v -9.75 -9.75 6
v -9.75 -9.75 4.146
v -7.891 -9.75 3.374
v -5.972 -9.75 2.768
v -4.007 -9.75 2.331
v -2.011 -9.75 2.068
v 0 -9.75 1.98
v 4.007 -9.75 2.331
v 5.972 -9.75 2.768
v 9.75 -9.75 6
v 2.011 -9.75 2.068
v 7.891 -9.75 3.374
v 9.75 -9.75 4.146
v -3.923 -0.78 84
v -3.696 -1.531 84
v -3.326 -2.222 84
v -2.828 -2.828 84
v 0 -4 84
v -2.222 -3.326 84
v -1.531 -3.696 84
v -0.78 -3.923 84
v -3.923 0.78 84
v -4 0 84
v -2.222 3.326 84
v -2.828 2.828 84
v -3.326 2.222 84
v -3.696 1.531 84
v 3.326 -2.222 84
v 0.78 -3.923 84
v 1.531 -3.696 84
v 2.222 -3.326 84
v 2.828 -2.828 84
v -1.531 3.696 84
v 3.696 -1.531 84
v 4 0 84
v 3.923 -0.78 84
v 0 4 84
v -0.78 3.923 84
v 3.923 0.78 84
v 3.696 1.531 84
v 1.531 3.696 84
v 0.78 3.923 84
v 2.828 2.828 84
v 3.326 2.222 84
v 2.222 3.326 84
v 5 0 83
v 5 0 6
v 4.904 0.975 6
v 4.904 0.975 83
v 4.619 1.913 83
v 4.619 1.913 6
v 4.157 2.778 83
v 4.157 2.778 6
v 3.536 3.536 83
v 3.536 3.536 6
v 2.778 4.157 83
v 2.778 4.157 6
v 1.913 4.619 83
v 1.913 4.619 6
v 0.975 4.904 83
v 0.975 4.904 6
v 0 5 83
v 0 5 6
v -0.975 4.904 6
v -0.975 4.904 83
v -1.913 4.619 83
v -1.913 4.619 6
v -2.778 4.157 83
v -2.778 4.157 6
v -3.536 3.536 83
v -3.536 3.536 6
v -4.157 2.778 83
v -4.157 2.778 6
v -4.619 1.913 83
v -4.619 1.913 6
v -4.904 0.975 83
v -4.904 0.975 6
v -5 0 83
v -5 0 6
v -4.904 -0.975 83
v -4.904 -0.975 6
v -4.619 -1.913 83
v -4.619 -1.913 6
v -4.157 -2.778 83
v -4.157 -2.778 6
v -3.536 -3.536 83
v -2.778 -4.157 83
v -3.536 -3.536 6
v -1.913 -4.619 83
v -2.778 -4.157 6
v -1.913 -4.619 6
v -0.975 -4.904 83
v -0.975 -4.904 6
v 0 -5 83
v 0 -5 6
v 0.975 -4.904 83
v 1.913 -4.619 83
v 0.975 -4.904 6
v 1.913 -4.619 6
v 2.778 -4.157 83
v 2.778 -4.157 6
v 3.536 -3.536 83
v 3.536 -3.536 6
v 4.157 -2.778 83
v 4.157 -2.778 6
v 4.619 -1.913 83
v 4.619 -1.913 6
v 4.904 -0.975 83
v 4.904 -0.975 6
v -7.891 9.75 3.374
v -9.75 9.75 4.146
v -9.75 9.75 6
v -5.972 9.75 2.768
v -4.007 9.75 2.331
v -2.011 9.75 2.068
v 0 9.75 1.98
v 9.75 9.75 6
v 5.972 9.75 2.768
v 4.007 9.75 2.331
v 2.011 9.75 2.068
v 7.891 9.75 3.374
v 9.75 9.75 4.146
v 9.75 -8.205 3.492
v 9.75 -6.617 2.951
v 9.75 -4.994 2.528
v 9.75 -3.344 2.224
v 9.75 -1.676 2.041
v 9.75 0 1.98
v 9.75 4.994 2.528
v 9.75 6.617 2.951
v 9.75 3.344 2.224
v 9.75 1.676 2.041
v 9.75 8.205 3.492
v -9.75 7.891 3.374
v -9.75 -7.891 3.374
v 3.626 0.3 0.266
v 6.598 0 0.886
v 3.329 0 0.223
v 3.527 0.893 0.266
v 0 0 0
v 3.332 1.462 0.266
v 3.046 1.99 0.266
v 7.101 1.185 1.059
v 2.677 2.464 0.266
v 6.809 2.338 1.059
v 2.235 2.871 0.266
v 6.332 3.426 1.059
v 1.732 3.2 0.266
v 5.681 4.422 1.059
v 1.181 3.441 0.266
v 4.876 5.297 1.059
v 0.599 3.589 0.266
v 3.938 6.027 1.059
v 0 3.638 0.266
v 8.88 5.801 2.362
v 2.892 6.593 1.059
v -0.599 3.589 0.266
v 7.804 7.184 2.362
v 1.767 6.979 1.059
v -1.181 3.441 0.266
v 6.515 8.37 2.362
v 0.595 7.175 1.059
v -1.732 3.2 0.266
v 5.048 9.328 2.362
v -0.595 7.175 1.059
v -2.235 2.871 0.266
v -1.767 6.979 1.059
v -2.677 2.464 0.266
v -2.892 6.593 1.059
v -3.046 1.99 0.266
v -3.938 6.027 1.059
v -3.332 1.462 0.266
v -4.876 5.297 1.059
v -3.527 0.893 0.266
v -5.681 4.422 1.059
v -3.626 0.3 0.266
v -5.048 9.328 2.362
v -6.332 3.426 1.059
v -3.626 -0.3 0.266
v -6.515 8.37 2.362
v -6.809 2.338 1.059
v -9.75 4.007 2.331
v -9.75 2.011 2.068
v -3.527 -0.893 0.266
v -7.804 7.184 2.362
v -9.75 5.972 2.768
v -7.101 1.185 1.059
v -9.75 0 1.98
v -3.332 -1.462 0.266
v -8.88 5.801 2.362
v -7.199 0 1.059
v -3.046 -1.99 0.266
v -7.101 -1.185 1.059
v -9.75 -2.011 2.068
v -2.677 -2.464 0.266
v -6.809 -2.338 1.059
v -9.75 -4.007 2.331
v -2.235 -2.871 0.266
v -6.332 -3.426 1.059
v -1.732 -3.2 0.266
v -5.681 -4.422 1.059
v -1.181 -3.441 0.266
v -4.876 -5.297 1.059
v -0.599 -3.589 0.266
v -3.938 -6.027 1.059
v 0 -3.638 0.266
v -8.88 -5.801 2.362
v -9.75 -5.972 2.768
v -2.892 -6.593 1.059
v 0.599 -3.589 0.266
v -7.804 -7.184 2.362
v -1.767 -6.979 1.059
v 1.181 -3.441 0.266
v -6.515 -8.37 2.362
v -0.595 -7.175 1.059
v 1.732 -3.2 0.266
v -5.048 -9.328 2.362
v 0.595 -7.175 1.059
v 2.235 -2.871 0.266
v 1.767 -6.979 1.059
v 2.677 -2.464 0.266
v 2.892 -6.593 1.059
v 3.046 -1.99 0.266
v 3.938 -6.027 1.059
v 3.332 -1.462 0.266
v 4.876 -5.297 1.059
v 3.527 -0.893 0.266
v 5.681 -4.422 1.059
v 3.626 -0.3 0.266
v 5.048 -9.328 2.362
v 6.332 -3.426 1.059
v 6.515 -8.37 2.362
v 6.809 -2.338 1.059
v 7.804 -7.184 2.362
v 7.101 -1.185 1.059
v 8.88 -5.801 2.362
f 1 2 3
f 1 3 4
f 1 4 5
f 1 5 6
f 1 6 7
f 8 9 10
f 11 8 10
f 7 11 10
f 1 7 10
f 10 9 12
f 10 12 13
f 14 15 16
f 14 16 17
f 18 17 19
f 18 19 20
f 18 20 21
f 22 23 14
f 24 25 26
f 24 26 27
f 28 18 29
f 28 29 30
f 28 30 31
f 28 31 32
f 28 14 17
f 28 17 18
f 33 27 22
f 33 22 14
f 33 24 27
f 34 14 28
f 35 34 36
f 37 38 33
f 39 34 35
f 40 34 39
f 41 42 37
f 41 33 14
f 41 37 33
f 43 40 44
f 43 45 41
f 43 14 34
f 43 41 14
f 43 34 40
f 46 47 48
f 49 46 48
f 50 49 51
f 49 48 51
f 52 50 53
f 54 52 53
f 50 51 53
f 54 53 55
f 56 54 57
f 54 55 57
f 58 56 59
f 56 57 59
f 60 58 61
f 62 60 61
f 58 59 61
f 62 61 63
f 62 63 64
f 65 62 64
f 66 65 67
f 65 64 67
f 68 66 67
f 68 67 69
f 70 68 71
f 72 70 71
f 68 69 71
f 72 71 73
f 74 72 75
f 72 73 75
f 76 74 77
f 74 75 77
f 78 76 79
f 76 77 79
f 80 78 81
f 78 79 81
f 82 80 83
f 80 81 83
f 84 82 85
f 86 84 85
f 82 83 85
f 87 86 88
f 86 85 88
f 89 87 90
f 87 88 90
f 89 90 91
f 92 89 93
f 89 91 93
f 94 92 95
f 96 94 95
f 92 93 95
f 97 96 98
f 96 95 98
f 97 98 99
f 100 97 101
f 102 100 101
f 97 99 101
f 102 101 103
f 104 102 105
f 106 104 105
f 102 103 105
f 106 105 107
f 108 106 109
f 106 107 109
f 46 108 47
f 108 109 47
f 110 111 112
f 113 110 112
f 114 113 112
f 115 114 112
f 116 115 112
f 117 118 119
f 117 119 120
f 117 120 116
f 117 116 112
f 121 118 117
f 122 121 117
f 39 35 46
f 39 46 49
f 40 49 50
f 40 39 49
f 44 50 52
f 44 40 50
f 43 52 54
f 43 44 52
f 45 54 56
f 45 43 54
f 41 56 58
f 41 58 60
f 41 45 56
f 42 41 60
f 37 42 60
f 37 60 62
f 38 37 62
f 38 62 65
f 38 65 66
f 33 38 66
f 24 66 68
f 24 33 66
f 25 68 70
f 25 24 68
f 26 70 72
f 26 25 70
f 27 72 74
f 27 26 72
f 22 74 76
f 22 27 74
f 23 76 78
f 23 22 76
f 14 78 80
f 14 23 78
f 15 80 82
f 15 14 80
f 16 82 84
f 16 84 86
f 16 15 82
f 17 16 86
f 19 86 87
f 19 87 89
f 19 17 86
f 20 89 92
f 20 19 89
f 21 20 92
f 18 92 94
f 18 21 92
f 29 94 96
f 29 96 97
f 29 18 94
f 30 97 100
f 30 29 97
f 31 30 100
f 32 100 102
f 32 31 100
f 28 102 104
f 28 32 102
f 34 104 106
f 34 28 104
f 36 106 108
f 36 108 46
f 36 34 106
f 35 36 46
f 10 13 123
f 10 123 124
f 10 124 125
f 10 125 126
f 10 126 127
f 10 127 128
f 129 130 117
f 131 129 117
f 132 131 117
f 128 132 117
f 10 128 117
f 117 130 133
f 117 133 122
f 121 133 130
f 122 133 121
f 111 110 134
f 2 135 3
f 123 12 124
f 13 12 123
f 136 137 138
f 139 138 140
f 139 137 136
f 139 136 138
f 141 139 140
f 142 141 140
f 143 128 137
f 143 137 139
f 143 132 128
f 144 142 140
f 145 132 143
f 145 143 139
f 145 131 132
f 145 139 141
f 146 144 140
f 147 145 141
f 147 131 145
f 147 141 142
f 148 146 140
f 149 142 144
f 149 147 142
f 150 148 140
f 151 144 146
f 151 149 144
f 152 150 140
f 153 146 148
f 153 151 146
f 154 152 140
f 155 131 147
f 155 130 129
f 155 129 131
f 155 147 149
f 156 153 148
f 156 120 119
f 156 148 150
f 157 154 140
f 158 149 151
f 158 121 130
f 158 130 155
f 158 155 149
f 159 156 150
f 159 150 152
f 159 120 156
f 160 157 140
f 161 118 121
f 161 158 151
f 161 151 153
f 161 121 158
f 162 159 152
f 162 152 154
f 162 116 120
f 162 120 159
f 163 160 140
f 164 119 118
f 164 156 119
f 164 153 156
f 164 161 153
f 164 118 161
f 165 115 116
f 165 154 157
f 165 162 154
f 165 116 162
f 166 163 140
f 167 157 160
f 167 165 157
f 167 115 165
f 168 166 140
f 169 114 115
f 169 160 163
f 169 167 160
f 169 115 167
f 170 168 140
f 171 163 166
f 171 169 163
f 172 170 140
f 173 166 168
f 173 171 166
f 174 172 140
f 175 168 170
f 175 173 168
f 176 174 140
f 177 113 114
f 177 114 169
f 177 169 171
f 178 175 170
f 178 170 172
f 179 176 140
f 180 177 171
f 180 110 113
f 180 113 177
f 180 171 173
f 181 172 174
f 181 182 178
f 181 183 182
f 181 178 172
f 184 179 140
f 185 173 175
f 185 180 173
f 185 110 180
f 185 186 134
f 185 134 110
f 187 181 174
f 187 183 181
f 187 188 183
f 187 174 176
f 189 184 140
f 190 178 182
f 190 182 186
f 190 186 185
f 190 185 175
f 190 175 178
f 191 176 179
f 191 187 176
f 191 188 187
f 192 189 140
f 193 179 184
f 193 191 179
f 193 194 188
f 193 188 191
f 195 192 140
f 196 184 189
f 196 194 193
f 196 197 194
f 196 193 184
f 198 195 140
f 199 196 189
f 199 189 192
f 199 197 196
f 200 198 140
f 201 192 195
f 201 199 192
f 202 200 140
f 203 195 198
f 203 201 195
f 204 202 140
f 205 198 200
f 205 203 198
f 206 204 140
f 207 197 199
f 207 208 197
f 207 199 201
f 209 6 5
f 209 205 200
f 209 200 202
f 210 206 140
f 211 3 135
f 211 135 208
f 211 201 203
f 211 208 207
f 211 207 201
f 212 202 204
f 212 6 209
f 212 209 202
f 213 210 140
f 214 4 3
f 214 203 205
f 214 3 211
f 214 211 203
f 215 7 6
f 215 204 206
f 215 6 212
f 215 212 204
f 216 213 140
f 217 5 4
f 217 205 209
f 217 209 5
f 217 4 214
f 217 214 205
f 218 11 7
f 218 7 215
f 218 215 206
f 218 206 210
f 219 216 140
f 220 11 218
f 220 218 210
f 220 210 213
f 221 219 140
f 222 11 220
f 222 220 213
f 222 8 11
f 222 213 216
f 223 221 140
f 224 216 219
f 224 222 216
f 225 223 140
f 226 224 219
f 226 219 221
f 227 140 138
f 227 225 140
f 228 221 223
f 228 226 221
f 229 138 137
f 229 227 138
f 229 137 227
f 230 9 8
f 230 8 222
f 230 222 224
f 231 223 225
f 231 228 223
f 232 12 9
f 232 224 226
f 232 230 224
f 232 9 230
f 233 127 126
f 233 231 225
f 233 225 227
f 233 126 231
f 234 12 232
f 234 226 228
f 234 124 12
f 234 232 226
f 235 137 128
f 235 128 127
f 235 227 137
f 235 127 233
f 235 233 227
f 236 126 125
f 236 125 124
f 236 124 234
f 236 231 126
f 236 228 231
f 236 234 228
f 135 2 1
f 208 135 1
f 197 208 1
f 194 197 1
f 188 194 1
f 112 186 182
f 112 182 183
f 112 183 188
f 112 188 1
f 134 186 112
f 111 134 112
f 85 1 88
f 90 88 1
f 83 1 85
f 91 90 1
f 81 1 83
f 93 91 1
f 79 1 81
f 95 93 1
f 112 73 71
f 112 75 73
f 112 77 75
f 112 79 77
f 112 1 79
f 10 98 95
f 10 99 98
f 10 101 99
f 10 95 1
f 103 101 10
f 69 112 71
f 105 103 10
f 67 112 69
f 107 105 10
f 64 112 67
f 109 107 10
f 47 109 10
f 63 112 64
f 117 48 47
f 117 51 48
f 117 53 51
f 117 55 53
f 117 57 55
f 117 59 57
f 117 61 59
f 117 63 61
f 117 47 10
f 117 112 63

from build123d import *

# Parameters (mm, degrees)
SKETCH2_W           = 19.5
SKETCH2_H           = 19.5
BOSS_EXTRUDE1_DEPTH = 6
SKETCH3_R           = 5
BOSS_EXTRUDE2_DEPTH = 78
CHAMFER1_SIZE       = 1


with BuildPart() as part:
    # Sketch2 → Boss-Extrude1 (new body)
    with BuildSketch(Plane.XY):
        Rectangle(SKETCH2_W, SKETCH2_H)
    extrude(amount=BOSS_EXTRUDE1_DEPTH)

    # Sketch3 → Boss-Extrude2 (add)
    with BuildSketch(Plane.XY.offset(6)):
        Circle(SKETCH3_R)
    extrude(amount=BOSS_EXTRUDE2_DEPTH)

    # Chamfer1
    chamfer1_edges = [part.edges().sort_by_distance(p)[0] for p in [
        (-5, 0, 84),
    ]]
    chamfer(chamfer1_edges, length=CHAMFER1_SIZE)

    # Sketch4 → Cut-Revolve1 (revolve, cut)
    with BuildSketch(Plane(origin=(0, 0, 0), x_dir=(1, 0, 0), z_dir=(0, 1, 0))):
        with BuildLine():
            Line((0, 8.673011737), (0, 0))
            ThreePointArc((0, 0), (17.67766953, -7.32233047), (25, -25))
            Line((25, -25), (33.673011737, -25))
            ThreePointArc((33.673011737, -25), (23.810414942, -1.189585058), (0, 8.673011737))
        make_face()
    revolve(axis=Axis((0, 0, 0), (0, 0, 1)), mode=Mode.SUBTRACT)


solid = part.part
